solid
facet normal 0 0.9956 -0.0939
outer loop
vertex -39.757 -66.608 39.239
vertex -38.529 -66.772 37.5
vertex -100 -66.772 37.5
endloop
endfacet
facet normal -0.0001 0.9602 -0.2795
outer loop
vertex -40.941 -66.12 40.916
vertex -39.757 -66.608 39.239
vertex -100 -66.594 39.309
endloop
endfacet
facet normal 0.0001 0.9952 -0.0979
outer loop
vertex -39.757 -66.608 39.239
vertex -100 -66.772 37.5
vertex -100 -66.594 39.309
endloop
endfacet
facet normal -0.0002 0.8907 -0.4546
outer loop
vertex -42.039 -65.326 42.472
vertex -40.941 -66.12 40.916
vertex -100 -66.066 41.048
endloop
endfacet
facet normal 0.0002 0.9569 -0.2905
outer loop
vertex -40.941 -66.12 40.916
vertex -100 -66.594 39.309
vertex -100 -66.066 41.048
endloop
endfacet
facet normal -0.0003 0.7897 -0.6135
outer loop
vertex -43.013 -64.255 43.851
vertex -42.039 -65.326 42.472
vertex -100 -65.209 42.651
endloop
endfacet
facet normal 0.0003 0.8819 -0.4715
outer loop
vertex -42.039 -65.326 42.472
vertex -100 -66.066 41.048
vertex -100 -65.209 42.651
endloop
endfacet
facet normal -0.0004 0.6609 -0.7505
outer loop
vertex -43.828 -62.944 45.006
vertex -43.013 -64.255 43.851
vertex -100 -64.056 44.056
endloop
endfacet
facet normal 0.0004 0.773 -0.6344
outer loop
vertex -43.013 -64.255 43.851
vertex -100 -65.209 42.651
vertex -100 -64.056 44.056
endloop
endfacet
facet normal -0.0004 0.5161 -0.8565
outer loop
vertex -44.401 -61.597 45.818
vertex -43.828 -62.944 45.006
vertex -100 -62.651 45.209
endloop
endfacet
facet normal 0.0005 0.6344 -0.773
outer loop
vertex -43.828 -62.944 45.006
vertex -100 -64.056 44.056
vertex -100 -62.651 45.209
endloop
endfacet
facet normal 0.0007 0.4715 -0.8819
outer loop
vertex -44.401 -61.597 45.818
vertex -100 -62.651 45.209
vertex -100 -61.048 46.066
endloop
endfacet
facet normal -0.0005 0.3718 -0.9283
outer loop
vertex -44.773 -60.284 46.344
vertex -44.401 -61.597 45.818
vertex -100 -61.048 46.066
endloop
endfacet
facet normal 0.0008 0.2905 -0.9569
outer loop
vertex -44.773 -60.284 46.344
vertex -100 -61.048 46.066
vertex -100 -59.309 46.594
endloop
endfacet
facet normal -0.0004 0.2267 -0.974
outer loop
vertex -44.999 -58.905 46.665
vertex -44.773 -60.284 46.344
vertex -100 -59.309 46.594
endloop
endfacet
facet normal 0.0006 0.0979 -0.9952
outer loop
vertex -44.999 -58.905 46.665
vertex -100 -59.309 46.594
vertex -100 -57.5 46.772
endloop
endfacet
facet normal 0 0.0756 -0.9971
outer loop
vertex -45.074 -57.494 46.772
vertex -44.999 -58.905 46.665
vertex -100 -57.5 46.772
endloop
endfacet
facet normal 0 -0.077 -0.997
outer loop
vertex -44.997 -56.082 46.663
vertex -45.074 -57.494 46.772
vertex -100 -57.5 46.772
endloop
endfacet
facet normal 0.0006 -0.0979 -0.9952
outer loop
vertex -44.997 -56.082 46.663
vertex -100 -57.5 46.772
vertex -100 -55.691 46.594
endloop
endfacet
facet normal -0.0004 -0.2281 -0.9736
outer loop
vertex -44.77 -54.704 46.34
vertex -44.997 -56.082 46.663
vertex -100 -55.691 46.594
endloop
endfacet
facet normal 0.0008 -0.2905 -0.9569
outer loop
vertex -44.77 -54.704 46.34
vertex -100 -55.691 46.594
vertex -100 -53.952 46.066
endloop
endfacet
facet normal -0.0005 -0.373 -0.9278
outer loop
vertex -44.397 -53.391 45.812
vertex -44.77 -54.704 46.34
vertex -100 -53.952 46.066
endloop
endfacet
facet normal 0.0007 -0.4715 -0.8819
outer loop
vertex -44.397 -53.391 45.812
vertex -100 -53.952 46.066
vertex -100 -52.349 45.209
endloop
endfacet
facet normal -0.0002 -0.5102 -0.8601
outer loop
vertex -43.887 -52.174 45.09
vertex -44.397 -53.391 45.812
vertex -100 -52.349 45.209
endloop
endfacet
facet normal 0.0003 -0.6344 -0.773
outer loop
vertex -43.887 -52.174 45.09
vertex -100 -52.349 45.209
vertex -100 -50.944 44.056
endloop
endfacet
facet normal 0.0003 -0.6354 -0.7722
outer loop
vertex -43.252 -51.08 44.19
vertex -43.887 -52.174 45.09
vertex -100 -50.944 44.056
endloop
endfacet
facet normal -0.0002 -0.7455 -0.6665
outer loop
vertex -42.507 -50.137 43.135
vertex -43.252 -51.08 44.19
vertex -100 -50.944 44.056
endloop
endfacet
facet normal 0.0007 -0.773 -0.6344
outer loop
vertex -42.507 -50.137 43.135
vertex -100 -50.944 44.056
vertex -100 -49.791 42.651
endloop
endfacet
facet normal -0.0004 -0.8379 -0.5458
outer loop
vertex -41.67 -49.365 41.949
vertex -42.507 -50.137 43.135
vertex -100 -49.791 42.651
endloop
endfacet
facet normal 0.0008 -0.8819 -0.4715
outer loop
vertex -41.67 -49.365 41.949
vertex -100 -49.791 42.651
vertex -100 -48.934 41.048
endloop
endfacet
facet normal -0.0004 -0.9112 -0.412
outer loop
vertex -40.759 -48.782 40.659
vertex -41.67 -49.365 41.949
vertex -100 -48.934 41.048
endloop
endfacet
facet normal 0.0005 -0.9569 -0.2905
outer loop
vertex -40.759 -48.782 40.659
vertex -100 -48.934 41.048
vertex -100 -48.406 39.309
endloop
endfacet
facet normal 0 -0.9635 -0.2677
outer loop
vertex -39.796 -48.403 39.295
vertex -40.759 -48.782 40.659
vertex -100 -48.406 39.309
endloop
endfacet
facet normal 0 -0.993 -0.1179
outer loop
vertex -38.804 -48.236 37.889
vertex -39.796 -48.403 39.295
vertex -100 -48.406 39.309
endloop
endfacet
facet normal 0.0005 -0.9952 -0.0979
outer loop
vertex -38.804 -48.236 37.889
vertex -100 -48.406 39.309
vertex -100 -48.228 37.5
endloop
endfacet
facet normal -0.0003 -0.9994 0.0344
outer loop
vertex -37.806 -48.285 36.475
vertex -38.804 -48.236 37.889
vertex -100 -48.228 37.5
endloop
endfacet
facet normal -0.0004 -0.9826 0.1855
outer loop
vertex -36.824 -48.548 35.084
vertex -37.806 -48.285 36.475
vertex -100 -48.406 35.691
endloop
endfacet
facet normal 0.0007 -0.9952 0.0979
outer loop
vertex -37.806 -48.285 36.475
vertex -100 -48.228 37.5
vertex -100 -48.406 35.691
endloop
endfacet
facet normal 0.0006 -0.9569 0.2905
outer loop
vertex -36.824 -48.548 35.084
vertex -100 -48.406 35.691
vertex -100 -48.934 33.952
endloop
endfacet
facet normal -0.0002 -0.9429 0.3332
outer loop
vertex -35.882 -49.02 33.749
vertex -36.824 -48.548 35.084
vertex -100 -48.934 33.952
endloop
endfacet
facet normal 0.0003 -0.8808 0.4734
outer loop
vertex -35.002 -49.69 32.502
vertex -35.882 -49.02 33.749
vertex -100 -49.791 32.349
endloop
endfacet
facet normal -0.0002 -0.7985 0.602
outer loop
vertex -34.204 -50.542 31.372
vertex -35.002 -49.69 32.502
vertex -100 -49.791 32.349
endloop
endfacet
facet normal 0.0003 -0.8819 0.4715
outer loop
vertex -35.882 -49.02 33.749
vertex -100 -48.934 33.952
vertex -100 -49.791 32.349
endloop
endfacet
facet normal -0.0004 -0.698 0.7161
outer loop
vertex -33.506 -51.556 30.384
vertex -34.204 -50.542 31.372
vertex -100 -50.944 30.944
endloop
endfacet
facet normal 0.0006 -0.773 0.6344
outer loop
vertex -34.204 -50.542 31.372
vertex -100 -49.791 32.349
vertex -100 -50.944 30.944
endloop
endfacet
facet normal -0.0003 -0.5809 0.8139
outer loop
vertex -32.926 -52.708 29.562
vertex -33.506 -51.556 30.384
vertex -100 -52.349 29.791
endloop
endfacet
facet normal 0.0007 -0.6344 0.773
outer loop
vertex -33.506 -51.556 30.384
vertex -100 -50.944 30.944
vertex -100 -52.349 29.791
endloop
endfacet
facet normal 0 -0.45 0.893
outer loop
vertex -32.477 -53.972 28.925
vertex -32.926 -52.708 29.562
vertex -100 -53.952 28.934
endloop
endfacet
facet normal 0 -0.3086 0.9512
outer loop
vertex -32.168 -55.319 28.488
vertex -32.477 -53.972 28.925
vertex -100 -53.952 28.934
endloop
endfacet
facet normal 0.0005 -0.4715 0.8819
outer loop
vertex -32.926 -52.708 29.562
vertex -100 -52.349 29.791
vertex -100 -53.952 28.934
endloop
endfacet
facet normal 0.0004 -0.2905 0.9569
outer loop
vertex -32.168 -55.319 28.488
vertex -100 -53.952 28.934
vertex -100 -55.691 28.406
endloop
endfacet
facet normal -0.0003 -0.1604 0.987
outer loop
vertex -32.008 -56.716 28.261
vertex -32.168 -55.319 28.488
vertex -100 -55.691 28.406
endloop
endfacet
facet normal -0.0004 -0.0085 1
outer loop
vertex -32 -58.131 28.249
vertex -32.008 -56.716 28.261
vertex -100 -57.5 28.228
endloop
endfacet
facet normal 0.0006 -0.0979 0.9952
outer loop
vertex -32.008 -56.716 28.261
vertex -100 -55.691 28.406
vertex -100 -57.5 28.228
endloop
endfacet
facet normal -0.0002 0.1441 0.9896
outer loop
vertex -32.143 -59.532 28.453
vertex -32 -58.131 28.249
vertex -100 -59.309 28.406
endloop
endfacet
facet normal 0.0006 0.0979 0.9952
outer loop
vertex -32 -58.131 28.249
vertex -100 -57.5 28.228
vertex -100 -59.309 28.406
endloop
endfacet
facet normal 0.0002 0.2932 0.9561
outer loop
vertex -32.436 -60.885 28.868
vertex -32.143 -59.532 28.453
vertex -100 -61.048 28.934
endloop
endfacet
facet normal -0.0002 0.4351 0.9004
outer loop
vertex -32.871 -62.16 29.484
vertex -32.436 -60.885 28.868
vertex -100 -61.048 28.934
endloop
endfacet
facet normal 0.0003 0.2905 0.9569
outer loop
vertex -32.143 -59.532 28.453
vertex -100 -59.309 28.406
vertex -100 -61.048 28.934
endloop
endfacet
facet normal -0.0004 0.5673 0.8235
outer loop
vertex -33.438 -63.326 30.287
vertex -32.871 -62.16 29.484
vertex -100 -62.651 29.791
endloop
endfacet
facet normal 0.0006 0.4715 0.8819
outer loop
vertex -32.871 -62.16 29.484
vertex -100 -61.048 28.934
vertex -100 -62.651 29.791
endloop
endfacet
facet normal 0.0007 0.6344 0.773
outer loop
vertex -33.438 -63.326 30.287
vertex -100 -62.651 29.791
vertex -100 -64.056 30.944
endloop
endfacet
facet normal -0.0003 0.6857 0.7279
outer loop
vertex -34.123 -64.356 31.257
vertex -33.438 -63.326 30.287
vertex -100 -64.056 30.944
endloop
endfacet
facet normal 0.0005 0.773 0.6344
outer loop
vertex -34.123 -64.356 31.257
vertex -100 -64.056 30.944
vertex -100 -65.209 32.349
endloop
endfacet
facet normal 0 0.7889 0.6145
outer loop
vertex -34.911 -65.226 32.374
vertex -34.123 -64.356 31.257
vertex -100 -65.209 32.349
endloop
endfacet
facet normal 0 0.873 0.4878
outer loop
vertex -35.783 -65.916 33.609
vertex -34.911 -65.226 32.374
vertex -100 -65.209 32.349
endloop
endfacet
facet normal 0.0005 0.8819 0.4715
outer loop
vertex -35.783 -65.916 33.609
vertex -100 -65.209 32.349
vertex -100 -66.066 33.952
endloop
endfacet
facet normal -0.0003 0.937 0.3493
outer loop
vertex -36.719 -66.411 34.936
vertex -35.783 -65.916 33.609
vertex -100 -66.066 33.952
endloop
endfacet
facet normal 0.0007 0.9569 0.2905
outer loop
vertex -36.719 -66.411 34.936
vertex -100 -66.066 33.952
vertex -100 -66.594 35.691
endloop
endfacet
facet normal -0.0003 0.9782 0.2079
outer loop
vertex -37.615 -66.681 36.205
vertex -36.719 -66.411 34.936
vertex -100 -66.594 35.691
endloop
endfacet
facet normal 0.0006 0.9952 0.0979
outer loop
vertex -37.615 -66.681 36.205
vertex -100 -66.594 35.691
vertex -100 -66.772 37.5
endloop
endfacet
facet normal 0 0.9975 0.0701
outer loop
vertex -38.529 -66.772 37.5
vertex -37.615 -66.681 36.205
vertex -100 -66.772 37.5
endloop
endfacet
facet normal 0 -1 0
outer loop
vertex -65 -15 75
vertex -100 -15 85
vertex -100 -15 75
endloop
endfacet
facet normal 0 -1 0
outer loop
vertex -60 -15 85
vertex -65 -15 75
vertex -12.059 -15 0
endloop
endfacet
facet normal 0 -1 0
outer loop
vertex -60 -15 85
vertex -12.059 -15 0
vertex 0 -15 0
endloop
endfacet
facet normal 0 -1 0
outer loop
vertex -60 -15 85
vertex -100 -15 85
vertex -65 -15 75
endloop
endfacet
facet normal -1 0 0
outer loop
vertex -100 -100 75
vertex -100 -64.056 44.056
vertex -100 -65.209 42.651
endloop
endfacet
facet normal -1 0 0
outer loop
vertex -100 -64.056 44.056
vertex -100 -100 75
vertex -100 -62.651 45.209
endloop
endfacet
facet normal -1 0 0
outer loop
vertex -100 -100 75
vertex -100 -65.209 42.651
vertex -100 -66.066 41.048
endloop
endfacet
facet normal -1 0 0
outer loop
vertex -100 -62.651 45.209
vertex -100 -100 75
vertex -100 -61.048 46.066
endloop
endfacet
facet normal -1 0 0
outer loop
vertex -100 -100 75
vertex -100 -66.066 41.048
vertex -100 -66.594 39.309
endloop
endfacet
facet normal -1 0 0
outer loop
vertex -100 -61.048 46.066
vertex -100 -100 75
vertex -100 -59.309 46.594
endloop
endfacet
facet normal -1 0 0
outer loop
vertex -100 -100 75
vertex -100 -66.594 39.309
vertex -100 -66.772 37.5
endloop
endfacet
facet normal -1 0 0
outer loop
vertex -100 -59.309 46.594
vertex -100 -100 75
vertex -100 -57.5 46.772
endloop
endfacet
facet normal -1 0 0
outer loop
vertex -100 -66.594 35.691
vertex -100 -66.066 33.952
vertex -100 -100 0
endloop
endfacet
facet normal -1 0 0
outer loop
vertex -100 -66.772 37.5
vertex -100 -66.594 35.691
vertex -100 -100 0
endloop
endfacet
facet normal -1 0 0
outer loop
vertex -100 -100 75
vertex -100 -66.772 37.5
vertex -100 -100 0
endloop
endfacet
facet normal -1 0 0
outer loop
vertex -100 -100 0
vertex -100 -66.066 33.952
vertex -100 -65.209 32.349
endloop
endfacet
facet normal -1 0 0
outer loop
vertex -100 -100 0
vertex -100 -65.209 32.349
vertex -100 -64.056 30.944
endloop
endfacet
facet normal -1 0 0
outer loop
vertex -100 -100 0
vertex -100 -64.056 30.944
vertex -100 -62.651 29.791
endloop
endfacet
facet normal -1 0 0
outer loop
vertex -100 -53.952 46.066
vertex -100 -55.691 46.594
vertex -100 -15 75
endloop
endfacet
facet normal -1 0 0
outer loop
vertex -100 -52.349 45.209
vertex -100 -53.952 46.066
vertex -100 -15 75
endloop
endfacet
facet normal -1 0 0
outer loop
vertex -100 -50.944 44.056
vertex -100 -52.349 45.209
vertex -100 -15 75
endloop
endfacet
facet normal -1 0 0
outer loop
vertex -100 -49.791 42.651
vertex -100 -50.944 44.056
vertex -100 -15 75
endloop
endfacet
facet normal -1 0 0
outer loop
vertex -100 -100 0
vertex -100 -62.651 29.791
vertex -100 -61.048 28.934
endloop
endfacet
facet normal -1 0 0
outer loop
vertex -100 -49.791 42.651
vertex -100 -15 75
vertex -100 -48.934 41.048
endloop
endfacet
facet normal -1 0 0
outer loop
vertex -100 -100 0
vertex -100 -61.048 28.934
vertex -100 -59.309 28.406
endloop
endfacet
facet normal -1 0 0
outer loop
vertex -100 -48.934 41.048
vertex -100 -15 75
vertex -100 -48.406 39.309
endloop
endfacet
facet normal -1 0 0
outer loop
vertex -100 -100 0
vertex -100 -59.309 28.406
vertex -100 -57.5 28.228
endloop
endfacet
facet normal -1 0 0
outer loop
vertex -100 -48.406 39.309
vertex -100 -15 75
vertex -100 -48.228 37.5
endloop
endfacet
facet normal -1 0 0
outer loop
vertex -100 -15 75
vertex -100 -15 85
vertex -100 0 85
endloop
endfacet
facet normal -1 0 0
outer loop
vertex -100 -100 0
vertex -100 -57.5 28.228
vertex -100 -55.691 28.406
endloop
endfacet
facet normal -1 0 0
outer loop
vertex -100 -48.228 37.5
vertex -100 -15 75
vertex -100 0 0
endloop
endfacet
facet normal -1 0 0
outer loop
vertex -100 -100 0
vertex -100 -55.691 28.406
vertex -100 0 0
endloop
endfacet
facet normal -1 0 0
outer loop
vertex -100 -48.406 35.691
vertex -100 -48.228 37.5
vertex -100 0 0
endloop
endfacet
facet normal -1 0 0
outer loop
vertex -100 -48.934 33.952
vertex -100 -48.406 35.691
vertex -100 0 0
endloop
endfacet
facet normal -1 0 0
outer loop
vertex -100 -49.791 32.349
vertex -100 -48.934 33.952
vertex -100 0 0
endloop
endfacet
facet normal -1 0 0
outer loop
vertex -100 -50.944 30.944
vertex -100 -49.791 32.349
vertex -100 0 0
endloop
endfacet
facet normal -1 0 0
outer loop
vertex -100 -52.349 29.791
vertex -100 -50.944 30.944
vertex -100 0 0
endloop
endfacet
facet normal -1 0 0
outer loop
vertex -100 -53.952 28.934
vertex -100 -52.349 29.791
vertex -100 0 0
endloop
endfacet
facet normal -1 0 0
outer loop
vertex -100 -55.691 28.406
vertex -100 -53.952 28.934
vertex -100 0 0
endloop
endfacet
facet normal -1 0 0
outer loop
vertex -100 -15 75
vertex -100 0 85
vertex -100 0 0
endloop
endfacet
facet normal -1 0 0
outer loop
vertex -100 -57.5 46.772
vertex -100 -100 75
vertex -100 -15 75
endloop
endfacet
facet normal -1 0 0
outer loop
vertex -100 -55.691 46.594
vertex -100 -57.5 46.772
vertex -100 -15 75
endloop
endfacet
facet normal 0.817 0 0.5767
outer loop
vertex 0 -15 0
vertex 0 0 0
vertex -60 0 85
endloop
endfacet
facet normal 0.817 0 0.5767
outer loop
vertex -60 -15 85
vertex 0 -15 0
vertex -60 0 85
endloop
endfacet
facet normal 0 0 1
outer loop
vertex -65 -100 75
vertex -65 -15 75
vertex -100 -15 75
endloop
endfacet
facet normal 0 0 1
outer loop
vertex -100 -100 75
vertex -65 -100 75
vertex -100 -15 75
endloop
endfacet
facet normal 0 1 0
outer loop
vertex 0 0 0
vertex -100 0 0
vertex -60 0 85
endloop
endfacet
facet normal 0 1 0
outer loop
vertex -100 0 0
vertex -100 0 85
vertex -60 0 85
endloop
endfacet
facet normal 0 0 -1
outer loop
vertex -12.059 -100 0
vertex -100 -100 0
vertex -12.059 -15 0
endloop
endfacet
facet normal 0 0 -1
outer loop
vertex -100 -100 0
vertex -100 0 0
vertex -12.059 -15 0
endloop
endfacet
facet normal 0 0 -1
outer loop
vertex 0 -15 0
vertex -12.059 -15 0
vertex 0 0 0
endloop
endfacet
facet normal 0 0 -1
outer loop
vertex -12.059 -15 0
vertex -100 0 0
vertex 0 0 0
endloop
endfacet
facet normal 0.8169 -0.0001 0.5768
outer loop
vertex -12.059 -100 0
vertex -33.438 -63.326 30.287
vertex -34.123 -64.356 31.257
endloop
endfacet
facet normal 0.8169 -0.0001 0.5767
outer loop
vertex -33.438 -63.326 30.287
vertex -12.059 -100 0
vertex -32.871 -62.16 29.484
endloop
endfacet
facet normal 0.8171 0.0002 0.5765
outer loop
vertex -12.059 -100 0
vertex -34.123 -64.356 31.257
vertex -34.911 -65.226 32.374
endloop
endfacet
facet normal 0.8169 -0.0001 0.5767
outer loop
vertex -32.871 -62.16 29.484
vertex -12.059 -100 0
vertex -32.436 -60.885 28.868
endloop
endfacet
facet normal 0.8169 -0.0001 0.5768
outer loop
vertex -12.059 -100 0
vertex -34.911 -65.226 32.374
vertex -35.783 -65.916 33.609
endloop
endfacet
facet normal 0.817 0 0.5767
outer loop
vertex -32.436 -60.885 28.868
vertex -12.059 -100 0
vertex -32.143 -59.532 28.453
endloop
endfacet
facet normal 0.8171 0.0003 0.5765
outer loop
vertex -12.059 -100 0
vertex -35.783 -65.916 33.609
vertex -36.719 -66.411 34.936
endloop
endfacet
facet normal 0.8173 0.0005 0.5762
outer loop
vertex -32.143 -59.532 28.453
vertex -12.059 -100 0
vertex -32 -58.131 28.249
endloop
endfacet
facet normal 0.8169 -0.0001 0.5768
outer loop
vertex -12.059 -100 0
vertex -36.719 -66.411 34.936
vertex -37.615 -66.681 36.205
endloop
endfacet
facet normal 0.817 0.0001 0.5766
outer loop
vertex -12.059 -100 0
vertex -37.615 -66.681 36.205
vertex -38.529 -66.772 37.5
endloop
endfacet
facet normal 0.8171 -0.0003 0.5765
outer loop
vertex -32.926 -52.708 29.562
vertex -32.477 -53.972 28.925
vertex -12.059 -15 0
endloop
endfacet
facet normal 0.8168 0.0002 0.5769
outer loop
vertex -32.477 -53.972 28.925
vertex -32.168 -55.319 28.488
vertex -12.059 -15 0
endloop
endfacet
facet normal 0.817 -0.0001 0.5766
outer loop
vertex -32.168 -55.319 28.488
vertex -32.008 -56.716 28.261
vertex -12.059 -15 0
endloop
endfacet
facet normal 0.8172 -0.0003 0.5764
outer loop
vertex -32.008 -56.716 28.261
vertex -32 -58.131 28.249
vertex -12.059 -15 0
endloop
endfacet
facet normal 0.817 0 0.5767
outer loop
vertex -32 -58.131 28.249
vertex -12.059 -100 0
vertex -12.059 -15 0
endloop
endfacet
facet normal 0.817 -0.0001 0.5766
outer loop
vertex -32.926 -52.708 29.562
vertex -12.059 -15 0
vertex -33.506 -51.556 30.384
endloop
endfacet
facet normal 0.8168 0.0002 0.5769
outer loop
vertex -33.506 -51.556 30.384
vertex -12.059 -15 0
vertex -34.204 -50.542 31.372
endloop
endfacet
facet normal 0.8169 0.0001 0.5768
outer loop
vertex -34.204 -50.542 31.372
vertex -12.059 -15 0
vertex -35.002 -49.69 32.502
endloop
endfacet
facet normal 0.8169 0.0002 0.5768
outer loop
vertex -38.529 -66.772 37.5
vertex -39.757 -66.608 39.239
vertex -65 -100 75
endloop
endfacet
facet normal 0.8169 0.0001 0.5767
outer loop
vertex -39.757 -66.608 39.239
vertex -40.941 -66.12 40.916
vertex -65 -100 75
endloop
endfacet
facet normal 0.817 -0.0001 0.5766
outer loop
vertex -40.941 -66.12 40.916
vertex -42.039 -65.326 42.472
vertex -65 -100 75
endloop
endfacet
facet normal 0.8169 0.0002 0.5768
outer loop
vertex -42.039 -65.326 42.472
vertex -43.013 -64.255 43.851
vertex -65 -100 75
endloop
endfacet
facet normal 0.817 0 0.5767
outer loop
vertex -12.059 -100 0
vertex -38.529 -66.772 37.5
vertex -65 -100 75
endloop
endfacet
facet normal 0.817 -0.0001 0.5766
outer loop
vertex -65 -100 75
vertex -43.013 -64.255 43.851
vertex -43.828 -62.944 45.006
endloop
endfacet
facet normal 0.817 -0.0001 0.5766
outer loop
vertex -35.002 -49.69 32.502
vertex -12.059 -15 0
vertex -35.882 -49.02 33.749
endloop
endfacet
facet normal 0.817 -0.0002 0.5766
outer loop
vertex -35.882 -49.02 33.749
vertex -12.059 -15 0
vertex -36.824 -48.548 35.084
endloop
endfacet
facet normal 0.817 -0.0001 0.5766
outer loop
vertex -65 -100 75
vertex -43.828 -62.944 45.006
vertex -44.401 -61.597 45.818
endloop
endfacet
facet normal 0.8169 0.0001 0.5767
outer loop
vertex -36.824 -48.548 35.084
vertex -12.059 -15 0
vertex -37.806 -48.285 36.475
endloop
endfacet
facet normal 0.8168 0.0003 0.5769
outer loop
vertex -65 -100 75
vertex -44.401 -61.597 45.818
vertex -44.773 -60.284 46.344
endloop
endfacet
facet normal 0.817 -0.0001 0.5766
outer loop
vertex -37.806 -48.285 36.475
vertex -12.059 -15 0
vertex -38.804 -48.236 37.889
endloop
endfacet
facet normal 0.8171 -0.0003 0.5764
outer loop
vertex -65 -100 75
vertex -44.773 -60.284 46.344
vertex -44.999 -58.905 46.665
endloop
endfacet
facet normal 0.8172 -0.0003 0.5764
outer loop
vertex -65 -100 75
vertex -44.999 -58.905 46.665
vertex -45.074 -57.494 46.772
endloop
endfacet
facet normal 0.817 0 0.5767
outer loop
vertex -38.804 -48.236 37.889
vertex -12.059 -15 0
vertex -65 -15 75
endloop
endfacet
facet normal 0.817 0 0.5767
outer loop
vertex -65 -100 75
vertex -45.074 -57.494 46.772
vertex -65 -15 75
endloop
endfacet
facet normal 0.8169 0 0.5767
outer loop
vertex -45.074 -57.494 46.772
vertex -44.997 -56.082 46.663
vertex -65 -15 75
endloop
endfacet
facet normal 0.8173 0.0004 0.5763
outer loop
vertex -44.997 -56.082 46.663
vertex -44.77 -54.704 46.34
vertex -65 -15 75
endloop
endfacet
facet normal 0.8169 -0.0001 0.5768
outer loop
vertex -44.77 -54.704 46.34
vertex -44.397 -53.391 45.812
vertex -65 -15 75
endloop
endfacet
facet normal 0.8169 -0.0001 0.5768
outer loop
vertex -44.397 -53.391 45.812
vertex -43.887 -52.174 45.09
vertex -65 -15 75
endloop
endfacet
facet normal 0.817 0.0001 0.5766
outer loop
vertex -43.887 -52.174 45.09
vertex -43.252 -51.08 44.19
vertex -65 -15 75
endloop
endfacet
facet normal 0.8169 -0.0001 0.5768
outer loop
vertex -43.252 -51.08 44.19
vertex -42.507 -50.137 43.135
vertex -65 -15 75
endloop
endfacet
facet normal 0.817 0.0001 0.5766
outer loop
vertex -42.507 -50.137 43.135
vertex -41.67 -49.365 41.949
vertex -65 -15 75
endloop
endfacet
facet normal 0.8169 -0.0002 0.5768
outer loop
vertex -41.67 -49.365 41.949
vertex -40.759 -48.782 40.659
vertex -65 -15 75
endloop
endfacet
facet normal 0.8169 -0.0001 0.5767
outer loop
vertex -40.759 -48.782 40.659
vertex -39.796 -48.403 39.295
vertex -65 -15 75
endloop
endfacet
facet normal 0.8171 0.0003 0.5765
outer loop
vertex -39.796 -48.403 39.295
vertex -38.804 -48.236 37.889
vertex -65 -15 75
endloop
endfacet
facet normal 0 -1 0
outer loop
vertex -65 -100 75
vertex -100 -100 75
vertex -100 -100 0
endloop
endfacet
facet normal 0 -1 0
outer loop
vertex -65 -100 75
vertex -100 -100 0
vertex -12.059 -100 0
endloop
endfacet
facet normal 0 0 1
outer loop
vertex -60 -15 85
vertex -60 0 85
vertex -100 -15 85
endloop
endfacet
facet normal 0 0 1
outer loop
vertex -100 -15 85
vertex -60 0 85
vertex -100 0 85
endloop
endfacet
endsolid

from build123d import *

# Parameters (mm, degrees)
F1_DEPTH = 15
F3_DEPTH = 85
F4_R     = 9.2721053172
F5_DEPTH = 100.001


with BuildPart() as f1:
    # F0 (on Front) → F1 (new body)
    with BuildSketch(Plane.XZ):
        Polygon((-100, 0), (0, 0), (-60, 85), (-100, 85), align=None)
    extrude(amount=F1_DEPTH)

    # F2 (on face) → F3 (join)
    with BuildSketch(Plane.XZ.offset(15)):
        Polygon((-65, 75), (-100, 75), (-100, 0), (-12.0588235294, 0), align=None)
    extrude(amount=F3_DEPTH)

    # F4 (on face) → F5 (cut, through all)
    with BuildSketch(Plane(origin=(-100, 0, 0), x_dir=(0, -1, 0), z_dir=(-1, 0, 0))):
        with Locations((57.5, 37.5)):
            Circle(F4_R)
    extrude(amount=-F5_DEPTH, mode=Mode.SUBTRACT)


solid = f1.part
